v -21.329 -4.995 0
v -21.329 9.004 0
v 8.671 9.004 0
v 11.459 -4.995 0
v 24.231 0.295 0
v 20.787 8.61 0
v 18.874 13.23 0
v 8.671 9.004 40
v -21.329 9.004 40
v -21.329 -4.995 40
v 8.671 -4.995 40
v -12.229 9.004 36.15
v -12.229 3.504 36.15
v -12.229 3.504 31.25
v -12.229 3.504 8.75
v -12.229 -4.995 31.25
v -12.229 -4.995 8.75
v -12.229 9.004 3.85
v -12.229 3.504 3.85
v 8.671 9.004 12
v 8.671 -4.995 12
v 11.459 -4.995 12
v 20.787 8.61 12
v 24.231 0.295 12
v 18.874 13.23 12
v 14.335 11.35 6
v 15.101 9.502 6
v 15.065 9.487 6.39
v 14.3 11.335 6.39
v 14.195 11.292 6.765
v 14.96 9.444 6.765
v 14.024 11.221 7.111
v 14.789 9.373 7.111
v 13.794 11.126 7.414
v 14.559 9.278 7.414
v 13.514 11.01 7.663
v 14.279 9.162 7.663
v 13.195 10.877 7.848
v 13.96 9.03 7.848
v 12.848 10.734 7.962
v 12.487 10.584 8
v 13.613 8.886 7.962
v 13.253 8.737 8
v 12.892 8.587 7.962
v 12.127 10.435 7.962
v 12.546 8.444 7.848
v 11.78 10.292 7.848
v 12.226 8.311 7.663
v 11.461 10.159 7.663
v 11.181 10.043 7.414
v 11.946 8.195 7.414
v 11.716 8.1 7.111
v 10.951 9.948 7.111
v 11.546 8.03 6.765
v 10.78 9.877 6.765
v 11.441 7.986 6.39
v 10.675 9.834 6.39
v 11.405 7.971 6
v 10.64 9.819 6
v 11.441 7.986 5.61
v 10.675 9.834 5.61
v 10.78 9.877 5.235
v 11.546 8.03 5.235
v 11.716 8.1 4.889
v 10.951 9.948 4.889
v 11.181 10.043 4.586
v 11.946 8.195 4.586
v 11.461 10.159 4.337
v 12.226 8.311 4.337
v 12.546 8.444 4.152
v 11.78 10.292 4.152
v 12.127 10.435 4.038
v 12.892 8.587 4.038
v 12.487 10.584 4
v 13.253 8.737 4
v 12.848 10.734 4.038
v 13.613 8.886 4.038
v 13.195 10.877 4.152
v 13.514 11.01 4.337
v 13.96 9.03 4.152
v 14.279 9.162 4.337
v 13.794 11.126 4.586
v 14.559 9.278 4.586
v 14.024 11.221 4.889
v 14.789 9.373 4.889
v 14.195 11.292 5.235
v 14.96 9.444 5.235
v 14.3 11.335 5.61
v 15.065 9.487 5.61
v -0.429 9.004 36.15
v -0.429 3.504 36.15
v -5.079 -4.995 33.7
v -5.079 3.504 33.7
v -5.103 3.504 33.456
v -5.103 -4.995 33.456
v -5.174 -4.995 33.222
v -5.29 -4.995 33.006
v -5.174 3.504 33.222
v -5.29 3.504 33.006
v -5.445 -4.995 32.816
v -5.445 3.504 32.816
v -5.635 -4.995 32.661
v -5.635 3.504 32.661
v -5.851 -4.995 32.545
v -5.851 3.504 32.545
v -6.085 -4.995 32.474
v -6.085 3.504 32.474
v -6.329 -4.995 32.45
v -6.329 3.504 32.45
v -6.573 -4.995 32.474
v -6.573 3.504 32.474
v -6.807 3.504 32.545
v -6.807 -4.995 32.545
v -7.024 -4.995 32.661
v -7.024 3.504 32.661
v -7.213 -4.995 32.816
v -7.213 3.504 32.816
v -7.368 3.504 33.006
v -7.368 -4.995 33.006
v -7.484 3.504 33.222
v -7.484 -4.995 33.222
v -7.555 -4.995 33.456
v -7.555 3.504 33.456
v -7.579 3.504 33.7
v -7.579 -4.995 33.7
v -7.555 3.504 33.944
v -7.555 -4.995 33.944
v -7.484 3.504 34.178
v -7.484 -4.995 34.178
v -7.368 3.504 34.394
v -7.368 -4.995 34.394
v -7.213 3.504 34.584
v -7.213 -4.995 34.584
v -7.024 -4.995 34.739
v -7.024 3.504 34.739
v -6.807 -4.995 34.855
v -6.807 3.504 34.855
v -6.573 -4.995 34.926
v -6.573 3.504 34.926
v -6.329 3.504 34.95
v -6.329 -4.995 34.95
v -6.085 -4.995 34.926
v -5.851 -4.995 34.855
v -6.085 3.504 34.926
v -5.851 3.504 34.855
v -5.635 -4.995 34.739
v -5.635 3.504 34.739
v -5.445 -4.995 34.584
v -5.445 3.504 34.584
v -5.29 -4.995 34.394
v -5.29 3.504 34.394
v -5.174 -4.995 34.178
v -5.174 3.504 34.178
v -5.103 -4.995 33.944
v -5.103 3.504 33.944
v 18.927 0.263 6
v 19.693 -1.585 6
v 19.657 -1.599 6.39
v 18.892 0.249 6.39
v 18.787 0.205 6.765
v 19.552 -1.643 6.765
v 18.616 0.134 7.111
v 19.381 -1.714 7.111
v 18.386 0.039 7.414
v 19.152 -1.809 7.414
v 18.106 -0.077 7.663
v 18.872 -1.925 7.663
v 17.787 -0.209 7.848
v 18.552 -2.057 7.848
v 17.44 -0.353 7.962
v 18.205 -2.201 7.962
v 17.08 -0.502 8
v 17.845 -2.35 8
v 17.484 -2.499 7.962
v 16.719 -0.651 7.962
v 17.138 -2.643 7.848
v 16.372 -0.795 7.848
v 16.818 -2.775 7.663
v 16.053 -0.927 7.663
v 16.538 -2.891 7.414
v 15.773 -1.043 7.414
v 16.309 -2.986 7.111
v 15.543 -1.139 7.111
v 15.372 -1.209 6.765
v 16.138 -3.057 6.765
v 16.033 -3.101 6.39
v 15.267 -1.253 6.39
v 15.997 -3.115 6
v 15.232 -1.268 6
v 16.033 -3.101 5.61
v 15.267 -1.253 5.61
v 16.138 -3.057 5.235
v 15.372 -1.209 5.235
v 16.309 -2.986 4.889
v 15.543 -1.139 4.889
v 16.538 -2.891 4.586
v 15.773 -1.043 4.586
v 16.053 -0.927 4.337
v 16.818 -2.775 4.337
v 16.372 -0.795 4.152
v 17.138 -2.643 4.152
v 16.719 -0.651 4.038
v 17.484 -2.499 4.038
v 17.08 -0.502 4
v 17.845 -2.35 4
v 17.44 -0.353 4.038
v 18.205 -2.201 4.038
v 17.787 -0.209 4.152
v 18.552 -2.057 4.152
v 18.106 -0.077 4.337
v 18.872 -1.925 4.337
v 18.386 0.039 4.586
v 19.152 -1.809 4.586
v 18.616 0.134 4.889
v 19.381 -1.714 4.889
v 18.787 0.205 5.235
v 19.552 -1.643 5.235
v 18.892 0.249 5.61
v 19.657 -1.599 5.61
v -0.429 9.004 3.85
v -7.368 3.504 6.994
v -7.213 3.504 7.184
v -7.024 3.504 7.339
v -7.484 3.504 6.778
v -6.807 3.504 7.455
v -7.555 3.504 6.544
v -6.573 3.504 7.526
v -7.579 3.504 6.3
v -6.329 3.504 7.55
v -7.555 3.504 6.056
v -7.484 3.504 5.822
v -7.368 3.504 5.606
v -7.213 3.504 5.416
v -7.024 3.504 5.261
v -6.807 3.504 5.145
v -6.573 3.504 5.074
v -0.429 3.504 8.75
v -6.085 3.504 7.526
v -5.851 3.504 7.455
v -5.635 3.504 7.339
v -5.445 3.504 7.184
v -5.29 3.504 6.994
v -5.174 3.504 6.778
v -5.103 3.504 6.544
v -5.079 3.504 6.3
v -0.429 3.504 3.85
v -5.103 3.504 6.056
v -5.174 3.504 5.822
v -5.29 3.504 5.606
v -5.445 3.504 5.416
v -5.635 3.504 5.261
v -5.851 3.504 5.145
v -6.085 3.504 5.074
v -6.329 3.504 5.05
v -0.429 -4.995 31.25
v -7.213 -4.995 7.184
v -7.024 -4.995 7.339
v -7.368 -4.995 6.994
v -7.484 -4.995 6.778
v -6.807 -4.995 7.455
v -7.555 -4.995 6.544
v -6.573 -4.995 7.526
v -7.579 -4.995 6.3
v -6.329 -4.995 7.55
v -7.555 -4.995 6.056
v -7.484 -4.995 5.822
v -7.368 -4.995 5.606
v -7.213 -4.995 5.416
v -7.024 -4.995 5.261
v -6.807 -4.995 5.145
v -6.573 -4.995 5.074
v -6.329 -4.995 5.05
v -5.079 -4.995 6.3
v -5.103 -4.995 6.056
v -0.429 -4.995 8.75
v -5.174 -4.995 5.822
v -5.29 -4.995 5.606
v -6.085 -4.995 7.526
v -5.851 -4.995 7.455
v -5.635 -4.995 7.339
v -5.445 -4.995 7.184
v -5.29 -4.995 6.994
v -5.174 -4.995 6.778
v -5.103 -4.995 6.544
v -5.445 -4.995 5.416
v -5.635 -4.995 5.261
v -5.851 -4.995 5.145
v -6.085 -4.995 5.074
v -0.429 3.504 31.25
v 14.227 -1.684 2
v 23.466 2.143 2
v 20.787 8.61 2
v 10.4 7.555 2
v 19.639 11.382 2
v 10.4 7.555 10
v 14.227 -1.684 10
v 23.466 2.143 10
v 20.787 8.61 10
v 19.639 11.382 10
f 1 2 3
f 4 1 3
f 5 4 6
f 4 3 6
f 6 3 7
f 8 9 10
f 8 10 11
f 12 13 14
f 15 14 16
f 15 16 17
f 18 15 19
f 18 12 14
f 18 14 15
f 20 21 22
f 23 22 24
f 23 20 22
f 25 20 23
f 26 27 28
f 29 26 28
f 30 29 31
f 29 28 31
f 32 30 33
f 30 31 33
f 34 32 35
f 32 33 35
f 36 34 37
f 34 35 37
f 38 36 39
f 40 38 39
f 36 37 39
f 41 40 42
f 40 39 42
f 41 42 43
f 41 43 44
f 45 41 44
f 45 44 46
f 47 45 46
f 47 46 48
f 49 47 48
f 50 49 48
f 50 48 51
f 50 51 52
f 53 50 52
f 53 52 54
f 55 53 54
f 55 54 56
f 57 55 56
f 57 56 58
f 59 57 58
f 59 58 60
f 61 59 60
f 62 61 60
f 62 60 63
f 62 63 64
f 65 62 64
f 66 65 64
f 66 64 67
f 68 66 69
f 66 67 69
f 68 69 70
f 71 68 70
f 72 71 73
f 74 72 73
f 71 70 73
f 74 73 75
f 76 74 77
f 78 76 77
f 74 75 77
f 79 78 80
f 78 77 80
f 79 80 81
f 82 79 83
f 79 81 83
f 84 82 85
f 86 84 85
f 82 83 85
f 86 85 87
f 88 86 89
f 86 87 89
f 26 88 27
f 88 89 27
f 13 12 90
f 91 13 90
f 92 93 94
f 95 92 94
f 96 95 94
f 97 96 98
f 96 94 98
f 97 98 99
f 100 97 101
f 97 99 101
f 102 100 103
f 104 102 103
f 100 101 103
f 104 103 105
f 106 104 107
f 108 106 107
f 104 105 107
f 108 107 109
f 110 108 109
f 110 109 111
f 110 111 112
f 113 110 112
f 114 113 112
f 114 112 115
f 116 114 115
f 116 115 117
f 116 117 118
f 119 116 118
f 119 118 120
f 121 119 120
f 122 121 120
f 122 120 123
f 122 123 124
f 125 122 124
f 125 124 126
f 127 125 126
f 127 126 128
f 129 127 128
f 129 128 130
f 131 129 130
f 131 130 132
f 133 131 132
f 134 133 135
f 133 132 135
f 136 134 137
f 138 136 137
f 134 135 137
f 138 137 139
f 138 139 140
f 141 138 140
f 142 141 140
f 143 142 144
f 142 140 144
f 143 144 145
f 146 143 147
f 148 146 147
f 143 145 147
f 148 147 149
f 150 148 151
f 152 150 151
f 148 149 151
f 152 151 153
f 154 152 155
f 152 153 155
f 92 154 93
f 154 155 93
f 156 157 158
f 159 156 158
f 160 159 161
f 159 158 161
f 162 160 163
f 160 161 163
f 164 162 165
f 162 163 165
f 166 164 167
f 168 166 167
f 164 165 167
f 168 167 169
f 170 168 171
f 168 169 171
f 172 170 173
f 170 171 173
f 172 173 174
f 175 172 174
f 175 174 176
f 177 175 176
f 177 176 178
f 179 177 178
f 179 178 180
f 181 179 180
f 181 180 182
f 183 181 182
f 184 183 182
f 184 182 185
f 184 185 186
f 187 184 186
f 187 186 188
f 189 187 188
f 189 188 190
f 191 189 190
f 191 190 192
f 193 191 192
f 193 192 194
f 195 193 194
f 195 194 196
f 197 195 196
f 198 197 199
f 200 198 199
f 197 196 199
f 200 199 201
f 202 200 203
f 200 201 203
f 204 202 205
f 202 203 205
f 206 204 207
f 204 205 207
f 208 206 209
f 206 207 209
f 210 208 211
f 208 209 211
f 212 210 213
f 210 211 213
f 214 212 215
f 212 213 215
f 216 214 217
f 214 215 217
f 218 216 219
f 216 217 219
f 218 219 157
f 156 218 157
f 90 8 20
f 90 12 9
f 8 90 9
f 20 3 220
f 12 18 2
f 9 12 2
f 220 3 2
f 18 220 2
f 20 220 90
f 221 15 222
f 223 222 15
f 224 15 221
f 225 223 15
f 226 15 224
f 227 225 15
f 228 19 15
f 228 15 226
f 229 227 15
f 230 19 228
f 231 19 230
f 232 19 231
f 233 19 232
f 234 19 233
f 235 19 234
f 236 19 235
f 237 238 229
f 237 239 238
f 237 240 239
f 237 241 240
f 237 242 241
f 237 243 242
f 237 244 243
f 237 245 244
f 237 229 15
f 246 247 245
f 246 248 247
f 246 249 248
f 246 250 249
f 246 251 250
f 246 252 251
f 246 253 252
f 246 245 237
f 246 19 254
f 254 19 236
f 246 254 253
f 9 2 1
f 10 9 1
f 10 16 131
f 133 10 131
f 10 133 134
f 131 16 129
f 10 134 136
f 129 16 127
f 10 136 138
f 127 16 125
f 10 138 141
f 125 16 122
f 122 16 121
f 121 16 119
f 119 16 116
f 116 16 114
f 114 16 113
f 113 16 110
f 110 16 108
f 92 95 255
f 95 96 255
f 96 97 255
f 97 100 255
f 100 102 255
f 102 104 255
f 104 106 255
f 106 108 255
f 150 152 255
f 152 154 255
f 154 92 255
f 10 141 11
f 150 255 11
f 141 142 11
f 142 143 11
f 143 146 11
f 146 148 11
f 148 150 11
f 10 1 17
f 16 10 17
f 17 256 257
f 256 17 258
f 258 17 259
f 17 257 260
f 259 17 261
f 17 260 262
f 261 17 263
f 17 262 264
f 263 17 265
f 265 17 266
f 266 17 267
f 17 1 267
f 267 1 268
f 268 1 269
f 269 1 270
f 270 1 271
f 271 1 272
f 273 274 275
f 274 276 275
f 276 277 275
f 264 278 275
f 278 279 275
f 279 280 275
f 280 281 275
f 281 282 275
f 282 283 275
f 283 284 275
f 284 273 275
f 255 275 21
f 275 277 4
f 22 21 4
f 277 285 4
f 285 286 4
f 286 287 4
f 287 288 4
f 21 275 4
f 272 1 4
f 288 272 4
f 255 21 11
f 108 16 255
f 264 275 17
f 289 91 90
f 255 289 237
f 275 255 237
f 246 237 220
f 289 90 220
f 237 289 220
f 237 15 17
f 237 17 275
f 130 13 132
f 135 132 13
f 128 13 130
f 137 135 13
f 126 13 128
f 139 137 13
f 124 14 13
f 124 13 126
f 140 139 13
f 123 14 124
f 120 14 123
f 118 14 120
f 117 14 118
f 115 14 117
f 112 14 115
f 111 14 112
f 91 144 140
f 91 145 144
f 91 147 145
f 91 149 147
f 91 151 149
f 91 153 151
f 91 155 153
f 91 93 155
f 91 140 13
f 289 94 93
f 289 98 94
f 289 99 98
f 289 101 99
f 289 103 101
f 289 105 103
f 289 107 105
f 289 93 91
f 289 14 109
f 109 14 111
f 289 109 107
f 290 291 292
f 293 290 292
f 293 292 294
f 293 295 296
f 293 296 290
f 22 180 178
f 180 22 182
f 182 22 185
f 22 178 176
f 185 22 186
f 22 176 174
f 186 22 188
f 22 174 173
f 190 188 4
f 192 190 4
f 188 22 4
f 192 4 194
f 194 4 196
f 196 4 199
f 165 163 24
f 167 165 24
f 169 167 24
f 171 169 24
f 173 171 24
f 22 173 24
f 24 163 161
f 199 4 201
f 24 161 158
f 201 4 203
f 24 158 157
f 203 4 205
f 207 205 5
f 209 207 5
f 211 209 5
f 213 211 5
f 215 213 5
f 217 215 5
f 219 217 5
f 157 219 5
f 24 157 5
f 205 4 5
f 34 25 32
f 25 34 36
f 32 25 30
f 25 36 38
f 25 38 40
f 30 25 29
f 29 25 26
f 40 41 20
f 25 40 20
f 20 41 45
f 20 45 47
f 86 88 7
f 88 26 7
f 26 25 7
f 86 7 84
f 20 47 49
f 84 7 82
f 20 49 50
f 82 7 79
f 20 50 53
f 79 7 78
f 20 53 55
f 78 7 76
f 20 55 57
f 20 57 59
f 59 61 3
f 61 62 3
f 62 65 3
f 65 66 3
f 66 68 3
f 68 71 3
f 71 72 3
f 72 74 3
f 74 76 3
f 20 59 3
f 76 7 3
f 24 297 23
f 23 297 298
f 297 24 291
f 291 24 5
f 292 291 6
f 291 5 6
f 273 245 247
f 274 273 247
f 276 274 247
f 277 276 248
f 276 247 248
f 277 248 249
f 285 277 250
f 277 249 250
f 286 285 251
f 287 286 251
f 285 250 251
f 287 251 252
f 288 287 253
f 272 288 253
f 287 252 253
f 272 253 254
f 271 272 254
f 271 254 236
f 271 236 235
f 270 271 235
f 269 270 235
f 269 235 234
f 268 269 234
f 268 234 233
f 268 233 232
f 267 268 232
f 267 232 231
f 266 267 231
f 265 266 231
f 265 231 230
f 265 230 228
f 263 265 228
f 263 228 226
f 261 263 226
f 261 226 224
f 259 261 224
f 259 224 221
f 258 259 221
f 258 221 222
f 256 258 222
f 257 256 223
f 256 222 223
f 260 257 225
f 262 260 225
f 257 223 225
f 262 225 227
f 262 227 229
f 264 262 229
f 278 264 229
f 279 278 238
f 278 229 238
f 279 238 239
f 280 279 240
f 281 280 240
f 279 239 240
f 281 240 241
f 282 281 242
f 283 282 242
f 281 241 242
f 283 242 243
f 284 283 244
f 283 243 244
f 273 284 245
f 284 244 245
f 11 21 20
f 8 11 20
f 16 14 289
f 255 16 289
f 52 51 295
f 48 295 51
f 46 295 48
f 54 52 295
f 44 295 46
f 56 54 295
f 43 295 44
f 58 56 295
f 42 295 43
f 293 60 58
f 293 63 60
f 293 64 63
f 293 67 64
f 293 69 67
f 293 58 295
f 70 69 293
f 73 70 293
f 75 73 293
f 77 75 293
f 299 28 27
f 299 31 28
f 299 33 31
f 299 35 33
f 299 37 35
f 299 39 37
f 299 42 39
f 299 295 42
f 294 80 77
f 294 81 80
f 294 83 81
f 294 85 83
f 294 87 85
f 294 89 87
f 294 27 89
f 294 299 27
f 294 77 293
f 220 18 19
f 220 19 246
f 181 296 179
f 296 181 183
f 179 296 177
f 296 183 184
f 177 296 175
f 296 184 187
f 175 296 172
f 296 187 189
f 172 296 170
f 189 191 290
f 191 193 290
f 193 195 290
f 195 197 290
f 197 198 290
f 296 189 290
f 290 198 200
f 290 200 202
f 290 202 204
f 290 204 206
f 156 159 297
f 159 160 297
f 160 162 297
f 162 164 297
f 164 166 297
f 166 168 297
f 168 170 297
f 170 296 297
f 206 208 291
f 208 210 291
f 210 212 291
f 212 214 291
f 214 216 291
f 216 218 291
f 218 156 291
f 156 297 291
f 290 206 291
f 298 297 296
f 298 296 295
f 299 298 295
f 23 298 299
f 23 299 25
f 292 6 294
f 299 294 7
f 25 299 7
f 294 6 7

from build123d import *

# Parameters (mm, degrees)
BOSS_EXTRUDE1_DEPTH = 40
SKETCH4_W           = 11.8
SKETCH4_H           = 32.3
CUT_EXTRUDE1_DEPTH  = 5.5
SKETCH5_W           = 11.8
SKETCH5_H           = 22.5
CUT_EXTRUDE2_DEPTH  = 9.498848241
SKETCH6_R           = 1.25
CUT_EXTRUDE3_DEPTH  = 9.498848241
BOSS_EXTRUDE2_DEPTH = 12
SKETCH8_W           = 8
SKETCH8_H           = 10
CUT_EXTRUDE4_DEPTH  = 10
SKETCH9_R           = 2
CUT_EXTRUDE5_DEPTH  = 30.384991323


with BuildPart() as part:
    # Sketch1 → Boss-Extrude1 (new body)
    with BuildSketch(Plane.XY):
        Polygon((8.670952565, 9.003587153), (-11.329047435, 9.003587153), (-21.329047435, 9.003587153), (-21.329047435, -4.995261088), (-11.329047435, -4.995261088), (8.670952565, -4.995261088), align=None)
    extrude(amount=BOSS_EXTRUDE1_DEPTH)

    # Sketch4 → Cut-Extrude1 (cut)
    with BuildSketch(Plane(origin=(0, 9.003587153, 0), x_dir=(1, 0, 0), z_dir=(0, 1, 0))):
        with Locations((-6.329047435, -20)):
            Rectangle(SKETCH4_W, SKETCH4_H)
    extrude(amount=-CUT_EXTRUDE1_DEPTH, mode=Mode.SUBTRACT)

    # Sketch5 → Cut-Extrude2 (cut, through all)
    with BuildSketch(Plane(origin=(0, 3.503587153, 0), x_dir=(1, 0, 0), z_dir=(0, 1, 0))):
        with Locations((-6.329047435, -20)):
            Rectangle(SKETCH5_W, SKETCH5_H)
    extrude(amount=-CUT_EXTRUDE2_DEPTH, mode=Mode.SUBTRACT)

    # Sketch6 → Cut-Extrude3 (cut, through all)
    with BuildSketch(Plane(origin=(0, 3.503587153, 0), x_dir=(1, 0, 0), z_dir=(0, 1, 0))):
        with Locations((-6.329047435, -6.3)):
            Circle(SKETCH6_R)
        with Locations((-6.329047435, -33.7)):
            Circle(SKETCH6_R)
    extrude(amount=-CUT_EXTRUDE3_DEPTH, mode=Mode.SUBTRACT)

    # Sketch7 → Boss-Extrude2 (add)
    with BuildSketch(Plane.XY):
        Polygon((8.670952565, 9.003587153), (8.670952565, -4.995261088), (11.458506302, -4.995261088), (24.231440373, 0.295461436), (20.787289482, 8.610377228), (18.87387232, 13.229774891), align=None)
    extrude(amount=BOSS_EXTRUDE2_DEPTH)

    # Sketch8 → Cut-Extrude4 (cut)
    with BuildSketch(Plane(origin=(20.787289482, 8.610377228, 0), x_dir=(0, 0, -1), z_dir=(0.923879533, 0.382683432, 0))):
        with Locations((-6, -2)):
            Rectangle(SKETCH8_W, SKETCH8_H)
    extrude(amount=-CUT_EXTRUDE4_DEPTH, mode=Mode.SUBTRACT)

    # Sketch9 → Cut-Extrude5 (cut, through all)
    with BuildSketch(Plane(origin=(3.444150891, -8.314915793, 0), x_dir=(0.923879533, 0.382683432, 0), z_dir=(0.382683432, -0.923879533, 0))):
        with Locations((15.587337893, 6)):
            Circle(SKETCH9_R)
    extrude(amount=-CUT_EXTRUDE5_DEPTH, mode=Mode.SUBTRACT)


solid = part.part
